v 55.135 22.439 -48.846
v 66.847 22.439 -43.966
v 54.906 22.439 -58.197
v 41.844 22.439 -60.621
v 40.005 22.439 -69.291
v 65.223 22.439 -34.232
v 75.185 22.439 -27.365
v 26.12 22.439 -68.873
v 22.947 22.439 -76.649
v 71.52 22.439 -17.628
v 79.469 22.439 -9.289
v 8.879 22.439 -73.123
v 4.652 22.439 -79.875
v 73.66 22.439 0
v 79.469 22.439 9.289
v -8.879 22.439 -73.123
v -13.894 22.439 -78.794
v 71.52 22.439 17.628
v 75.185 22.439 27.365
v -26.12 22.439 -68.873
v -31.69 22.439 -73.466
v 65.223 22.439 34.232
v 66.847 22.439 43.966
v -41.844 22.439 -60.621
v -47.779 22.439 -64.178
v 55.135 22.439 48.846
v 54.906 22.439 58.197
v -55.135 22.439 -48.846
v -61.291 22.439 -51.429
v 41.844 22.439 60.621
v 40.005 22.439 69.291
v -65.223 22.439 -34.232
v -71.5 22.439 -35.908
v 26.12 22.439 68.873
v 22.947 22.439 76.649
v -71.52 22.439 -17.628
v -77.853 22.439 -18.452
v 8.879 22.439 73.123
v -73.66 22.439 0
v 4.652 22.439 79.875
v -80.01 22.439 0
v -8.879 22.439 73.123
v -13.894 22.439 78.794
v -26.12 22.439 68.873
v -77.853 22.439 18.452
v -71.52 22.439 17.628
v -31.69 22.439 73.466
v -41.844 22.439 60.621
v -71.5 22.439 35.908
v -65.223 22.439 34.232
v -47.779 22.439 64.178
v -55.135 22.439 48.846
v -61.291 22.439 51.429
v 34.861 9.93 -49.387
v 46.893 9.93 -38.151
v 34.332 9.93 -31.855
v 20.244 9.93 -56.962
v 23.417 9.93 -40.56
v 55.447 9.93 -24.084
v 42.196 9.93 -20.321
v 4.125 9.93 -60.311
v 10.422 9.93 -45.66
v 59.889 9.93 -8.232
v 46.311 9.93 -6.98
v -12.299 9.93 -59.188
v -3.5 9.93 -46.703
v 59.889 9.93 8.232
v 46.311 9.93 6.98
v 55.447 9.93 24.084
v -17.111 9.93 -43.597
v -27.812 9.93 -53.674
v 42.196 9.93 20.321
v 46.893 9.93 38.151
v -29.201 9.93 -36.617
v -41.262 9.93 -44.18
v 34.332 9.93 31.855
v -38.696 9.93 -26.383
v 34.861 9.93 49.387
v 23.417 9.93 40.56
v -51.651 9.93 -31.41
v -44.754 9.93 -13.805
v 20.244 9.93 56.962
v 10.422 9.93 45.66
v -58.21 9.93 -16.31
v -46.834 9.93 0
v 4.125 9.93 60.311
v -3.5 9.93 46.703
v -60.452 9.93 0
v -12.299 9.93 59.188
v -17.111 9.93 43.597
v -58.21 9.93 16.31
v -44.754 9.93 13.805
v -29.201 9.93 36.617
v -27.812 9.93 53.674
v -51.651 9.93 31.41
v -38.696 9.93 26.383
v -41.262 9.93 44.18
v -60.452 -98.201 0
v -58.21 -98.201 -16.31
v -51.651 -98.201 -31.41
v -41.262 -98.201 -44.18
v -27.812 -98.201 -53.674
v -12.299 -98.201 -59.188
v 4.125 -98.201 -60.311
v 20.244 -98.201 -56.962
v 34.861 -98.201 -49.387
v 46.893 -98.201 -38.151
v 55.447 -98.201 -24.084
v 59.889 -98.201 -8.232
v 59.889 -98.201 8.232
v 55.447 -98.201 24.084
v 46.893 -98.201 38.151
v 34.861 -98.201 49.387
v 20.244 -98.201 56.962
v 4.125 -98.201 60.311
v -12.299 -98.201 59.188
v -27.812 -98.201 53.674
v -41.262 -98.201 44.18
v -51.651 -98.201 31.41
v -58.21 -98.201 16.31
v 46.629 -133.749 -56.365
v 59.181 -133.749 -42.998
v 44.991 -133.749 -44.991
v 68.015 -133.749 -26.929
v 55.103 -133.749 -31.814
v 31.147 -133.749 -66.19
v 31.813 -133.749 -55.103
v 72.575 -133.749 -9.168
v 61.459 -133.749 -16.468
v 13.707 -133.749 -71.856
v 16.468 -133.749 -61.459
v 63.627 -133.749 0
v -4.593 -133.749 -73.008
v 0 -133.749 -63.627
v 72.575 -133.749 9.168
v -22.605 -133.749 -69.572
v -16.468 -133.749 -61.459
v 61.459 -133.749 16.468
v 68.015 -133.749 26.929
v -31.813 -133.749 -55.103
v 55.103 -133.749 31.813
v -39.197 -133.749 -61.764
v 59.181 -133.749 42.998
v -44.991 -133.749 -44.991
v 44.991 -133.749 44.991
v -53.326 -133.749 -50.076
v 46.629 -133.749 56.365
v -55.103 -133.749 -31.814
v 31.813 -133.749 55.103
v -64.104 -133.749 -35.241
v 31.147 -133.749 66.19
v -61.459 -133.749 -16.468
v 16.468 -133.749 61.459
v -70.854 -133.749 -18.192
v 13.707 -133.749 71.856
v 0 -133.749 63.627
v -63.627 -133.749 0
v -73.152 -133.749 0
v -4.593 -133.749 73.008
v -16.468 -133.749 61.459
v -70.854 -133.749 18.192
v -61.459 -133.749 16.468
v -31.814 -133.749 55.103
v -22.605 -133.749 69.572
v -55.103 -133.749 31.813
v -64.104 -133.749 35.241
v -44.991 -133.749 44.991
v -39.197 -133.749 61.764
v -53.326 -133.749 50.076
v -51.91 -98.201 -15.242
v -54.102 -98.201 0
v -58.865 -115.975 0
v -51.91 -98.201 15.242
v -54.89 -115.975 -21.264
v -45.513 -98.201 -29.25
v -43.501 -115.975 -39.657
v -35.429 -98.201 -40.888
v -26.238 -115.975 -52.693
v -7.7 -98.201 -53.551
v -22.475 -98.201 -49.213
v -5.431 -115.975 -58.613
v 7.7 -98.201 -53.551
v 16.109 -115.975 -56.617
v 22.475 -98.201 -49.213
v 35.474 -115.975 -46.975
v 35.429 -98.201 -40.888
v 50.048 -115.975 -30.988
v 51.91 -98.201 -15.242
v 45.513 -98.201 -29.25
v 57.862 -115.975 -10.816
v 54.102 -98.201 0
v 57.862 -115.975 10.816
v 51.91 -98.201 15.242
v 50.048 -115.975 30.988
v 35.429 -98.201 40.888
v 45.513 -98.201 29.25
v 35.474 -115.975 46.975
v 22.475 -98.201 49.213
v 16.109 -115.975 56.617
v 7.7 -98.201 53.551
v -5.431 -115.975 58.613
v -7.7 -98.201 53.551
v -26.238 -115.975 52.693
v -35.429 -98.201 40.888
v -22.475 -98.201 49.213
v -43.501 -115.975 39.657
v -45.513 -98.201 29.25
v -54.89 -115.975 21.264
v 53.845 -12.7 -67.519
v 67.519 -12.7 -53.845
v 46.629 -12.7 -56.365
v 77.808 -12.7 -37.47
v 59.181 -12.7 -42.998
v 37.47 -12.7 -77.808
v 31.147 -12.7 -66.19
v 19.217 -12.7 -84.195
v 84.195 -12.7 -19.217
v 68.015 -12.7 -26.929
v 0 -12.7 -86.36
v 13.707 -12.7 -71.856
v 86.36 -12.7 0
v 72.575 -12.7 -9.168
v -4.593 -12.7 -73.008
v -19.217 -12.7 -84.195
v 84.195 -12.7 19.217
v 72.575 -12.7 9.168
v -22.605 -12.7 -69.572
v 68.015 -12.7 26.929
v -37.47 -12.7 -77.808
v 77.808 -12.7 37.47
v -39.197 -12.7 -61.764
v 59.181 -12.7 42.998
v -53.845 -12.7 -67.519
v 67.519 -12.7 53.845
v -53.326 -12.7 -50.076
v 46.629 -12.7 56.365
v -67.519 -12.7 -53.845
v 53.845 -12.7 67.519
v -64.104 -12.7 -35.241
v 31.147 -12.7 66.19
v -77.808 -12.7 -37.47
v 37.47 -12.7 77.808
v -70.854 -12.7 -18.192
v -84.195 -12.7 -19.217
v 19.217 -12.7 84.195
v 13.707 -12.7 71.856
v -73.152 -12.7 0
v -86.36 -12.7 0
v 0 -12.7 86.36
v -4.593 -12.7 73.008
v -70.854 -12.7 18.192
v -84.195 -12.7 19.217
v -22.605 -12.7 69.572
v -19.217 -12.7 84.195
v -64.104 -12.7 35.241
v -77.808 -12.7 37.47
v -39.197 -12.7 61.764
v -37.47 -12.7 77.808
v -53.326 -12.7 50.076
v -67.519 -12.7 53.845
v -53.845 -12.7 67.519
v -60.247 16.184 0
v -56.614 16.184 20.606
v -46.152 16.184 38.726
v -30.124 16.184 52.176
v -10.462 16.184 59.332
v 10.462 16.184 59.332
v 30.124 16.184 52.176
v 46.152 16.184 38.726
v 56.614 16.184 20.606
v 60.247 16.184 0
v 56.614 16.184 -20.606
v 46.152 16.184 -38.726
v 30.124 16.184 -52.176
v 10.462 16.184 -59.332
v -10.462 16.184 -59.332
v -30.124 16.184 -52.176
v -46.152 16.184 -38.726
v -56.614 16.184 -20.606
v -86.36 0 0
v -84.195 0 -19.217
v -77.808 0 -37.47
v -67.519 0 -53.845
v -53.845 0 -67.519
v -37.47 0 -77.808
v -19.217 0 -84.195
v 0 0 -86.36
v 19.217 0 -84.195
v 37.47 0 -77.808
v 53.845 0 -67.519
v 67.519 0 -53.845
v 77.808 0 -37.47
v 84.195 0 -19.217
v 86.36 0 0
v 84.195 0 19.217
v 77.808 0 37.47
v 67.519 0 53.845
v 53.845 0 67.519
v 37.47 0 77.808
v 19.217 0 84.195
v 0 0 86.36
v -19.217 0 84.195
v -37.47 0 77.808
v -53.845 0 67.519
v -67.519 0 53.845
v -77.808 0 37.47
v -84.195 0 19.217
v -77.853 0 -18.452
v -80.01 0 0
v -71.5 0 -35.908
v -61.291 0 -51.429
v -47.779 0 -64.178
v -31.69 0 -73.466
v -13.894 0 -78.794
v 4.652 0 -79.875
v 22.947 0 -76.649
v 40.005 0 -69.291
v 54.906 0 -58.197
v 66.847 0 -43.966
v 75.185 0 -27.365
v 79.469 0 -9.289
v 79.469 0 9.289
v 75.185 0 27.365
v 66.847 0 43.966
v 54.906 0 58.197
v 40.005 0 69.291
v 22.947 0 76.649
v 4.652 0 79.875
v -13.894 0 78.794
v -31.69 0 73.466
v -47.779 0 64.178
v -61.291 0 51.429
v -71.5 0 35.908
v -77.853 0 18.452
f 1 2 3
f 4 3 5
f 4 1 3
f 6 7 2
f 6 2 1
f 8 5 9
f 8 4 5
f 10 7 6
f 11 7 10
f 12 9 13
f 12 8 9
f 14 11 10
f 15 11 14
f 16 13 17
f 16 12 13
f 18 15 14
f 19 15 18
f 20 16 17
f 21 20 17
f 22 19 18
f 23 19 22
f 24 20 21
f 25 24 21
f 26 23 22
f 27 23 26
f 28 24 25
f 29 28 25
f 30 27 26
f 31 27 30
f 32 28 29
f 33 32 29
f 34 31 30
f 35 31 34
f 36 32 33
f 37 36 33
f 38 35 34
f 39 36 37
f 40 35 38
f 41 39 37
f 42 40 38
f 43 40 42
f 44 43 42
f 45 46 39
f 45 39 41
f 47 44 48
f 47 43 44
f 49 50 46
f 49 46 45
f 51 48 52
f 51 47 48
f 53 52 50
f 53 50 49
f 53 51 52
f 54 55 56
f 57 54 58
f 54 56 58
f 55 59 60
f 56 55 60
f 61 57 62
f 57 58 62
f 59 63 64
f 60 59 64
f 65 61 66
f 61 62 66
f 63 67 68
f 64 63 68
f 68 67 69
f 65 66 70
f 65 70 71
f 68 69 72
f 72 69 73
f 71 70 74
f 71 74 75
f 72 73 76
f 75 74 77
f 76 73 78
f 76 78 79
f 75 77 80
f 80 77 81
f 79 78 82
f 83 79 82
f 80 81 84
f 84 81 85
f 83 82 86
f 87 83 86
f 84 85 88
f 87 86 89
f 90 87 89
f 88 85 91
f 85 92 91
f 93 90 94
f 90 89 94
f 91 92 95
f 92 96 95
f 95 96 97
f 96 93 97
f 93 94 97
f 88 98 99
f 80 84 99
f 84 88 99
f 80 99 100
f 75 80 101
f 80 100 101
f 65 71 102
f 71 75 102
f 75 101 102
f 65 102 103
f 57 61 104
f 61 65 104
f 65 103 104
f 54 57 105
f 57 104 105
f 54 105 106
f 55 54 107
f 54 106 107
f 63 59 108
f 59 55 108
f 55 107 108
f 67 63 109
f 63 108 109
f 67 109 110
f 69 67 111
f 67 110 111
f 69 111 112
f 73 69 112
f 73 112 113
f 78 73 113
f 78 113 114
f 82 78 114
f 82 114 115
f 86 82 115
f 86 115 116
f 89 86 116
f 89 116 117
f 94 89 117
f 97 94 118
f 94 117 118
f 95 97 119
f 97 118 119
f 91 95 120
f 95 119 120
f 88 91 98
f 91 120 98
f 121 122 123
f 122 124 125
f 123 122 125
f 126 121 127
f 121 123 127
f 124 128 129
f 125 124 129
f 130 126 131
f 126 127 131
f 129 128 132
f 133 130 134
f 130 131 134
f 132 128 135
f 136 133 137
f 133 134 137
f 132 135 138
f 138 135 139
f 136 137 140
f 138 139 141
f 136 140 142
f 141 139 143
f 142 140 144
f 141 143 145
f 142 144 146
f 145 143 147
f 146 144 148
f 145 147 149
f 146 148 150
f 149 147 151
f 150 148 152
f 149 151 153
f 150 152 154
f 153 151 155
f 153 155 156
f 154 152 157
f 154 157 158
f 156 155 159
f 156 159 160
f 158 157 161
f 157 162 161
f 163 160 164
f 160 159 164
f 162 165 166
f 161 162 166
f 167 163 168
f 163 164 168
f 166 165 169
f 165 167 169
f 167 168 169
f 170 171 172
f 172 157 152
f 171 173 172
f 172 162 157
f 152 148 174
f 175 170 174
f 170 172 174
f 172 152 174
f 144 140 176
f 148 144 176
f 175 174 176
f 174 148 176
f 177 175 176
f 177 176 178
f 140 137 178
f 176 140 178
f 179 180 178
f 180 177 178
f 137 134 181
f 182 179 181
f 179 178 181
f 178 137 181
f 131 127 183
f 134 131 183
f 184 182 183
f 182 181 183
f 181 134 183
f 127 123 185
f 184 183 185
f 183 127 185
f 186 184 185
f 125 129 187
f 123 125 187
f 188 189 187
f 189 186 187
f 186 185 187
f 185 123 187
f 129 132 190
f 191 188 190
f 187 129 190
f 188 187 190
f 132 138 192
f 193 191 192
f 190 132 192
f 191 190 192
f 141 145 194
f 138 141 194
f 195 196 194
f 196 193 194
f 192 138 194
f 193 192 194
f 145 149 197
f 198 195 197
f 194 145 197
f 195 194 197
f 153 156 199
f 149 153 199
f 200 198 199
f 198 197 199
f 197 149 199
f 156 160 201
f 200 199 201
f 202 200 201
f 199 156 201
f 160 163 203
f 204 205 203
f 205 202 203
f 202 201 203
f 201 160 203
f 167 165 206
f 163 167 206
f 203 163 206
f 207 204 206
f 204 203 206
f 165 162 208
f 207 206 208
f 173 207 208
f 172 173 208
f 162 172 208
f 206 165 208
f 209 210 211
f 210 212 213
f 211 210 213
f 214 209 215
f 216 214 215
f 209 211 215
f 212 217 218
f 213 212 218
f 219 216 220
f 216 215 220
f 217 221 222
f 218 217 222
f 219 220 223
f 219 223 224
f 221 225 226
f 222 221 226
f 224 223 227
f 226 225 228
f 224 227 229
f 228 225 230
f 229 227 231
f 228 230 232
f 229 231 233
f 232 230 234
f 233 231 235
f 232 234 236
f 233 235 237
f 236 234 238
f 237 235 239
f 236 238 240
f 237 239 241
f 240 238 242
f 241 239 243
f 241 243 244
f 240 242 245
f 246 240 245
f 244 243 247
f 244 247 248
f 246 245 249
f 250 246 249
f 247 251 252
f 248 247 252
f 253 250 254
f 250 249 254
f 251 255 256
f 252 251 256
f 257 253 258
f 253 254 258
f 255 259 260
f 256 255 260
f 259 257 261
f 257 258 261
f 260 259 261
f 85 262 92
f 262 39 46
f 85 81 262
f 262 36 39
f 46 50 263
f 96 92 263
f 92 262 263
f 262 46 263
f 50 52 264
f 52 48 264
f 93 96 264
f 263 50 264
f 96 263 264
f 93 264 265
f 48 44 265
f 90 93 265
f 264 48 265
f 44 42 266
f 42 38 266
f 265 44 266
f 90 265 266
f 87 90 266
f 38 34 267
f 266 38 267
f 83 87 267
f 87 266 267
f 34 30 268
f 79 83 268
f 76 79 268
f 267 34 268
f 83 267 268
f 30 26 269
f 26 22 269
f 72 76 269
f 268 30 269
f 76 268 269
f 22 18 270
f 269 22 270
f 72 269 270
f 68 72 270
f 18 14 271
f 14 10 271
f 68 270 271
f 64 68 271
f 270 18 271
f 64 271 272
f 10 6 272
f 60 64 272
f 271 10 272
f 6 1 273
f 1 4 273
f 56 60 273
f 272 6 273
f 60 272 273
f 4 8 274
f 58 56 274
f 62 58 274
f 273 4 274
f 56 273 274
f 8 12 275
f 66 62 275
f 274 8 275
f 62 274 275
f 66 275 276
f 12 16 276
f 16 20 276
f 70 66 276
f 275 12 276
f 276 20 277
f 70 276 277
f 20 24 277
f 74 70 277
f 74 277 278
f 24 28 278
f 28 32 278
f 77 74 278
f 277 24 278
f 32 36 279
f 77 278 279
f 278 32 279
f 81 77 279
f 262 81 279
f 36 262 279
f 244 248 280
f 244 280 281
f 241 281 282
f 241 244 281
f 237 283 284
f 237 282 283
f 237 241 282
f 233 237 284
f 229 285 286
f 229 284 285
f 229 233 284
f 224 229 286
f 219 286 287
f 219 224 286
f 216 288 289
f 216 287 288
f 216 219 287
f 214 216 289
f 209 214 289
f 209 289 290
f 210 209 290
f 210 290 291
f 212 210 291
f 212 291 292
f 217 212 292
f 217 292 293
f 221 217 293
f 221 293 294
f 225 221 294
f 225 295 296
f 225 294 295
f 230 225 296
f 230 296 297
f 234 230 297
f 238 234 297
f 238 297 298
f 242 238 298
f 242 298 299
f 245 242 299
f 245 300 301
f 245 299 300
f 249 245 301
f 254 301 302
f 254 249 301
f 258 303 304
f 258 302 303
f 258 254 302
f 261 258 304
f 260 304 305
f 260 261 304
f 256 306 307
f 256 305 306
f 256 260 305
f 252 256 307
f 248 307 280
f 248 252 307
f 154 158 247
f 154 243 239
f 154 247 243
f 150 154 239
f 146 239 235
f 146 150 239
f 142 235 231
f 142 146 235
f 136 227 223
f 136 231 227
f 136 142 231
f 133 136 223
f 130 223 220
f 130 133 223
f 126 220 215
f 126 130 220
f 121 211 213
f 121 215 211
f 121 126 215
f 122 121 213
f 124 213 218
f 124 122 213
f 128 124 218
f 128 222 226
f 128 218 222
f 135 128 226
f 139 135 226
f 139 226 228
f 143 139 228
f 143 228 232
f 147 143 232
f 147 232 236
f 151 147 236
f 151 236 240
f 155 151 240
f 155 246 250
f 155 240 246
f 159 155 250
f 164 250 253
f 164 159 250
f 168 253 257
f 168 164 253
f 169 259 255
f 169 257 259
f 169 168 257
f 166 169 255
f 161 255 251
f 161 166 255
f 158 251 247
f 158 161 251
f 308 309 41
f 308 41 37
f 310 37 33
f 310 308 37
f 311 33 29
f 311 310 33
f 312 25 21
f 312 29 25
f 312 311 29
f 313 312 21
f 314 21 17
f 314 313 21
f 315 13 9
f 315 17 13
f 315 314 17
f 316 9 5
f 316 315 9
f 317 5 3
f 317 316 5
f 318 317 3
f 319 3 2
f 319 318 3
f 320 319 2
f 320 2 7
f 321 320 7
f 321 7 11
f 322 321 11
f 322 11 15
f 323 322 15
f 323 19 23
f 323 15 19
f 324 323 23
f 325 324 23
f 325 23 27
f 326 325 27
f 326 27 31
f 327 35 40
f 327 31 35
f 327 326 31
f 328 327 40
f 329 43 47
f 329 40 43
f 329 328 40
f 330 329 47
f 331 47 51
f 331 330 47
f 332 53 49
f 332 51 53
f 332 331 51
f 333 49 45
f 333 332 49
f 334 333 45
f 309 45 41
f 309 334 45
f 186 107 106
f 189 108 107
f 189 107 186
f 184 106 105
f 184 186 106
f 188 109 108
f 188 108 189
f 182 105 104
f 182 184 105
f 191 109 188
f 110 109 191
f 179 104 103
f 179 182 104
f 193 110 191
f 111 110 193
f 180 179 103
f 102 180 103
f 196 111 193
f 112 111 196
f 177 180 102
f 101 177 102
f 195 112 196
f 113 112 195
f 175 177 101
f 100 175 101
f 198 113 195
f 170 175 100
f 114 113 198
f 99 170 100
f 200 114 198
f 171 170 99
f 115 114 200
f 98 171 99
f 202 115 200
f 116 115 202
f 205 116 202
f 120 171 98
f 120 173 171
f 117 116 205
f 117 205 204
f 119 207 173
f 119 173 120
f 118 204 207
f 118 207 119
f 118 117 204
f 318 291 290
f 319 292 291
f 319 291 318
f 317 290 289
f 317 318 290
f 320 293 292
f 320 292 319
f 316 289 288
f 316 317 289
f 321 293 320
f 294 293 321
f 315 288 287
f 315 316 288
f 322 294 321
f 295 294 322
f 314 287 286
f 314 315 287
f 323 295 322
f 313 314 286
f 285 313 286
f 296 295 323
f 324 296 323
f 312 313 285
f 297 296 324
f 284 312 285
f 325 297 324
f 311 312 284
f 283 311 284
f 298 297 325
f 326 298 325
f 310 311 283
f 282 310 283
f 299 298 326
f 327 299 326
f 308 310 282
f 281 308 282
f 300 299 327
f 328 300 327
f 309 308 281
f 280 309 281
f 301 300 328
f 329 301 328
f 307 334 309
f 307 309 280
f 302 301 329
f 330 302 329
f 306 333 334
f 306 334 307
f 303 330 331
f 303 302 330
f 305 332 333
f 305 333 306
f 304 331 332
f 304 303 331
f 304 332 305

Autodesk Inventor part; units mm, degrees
ref_plane "YZ Plane" through (0, 0, 0) normal (1, 0, 0) x (0, 1, 0)
ref_plane "XZ Plane" through (0, 0, 0) normal (0, 1, 0) x (-1, 0, 0)
ref_plane "XY Plane" through (0, 0, 0) normal (0, 0, 1) x (1, 0, 0)
sketch "Sketch1" plane through (0, 0, 0) normal (0, 0, 1) x (1, 0, 0)
  line L0 (0, 25.4) -> (-28.702, 25.4) construction
  line L1 (0, 25.4) -> (-86.36, 25.4) construction
  line L2 (-86.36, 25.4) -> (-80.01, 25.4) construction
  line L3 (-80.01, 25.4) -> (-73.66, 22.4389) construction
  line L4 (-80.01, 25.4) -> (-80.01, 22.4389) construction
  line L5 (-80.01, 0) -> (-86.36, 0)
  line L6 (-28.702, 59.6457) -> (-28.702, -91.9304) construction
  arc A0 (-28.9184, -4.2142) -> (-32.3684, 3.1843) centre (-35.052, -2.5707) ccw
  line L7 (-67.31, -147.4937) -> (-28.9184, -4.2142)
  line L8 (-80.01, 22.4389) -> (-73.66, 22.4389)
  line L9 (-80.01, 22.4389) -> (-80.01, 0)
  line L10 (-73.66, 22.4389) -> (-32.3684, 3.1843)
  line L11 (-28.702, -2.5707) -> (-60.452, -2.5707) construction
  line L12 (-60.452, 16.28) -> (-60.452, -121.8993) construction
  line L13 (-60.452, -121.8993) -> (-54.102, -121.8993) construction
  line L14 (-54.102, -121.8993) -> (-54.102, -98.2008) construction
  line L15 (-54.102, -98.2008) -> (-60.452, -98.2008)
  line L16 (-60.452, 16.28) -> (-60.452, 6.755) construction
  line L17 (-60.452, 16.28) -> (-60.452, 9.93) construction
  line L18 (-60.452, 9.93) -> (-46.8344, 9.93)
  line L19 (-60.452, 9.93) -> (-60.452, -98.2008)
  line L20 (-86.36, 0) -> (-86.36, -12.7) construction
  line L21 (-60.452, -12.7) -> (-73.152, -12.7) construction
  line L22 (-86.36, -12.7) -> (-86.36, -25.4) construction
  line L23 (-86.36, -25.4) -> (-86.36, -88.9) construction
  line L24 (-86.36, -88.9) -> (-73.66, -88.9) construction
  line L25 (-73.66, -88.9) -> (-73.66, -25.4) construction
  line L26 (-86.36, -25.4) -> (-73.66, -25.4)
  line L27 (-73.66, -25.4) -> (-73.66, -88.9)
  line L28 (-73.66, -88.9) -> (-86.36, -88.9)
  line L29 (-86.36, -12.7) -> (-73.152, -12.7)
  line L30 (-73.152, -133.7486) -> (-63.627, -133.7486)
  line L31 (-73.66, -88.9) -> (-73.66, -147.4937)
  line L32 (-73.66, -147.4937) -> (-67.31, -147.4937)
  line L33 (-73.152, -12.7) -> (-73.152, -133.7486)
  line L34 (-80.01, -25.4) -> (-80.01, -31.3436)
  line L35 (-80.01, -31.3436) -> (-86.36, -31.3436)
  line L36 (-86.36, 0) -> (-86.36, -25.4)
  line L37 (-86.36, -31.3436) -> (-86.36, -88.9)
  line L38 (0, -319.0244) -> (0, 122.7573) projected
  point P0 (0, 0)
  point P1 (-86.36, -255.9127)
  point P2 (-76.835, 22.4389)
  dimension "d0" = 28.702
  dimension "d1" = 86.36
  dimension "d2" = 6.35
  dimension "d3" = 25
  dimension "d5" = 25.4
  dimension "d6" = 25.4
  dimension "d8" = 12.7
  dimension "d11" = 6.35
  dimension "d12" = 31.75
  dimension "d13" = 6.35
  dimension "d15" = 6.35
  dimension "d16" = 12.7
  dimension "d17" = 12.7
  dimension "d18" = 12.7
  dimension "d19" = 63.5
  dimension "d20" = 12.7
  dimension "d22" = 9.525
  dimension "d23" = 6.35
  dimension "d25" = 5.9436
  dimension "d26" = 15
revolve "Revolution2" add sketch "Sketch1" angle 360 about axis through (0, -10, 0) along (0, 1, 0) contours L9 L8 L10 L18 L19 L15 L7 L30 L33 L29 L36 L5
properties part number "Phenolic Master Sketch" material "Phenolic Resin"
